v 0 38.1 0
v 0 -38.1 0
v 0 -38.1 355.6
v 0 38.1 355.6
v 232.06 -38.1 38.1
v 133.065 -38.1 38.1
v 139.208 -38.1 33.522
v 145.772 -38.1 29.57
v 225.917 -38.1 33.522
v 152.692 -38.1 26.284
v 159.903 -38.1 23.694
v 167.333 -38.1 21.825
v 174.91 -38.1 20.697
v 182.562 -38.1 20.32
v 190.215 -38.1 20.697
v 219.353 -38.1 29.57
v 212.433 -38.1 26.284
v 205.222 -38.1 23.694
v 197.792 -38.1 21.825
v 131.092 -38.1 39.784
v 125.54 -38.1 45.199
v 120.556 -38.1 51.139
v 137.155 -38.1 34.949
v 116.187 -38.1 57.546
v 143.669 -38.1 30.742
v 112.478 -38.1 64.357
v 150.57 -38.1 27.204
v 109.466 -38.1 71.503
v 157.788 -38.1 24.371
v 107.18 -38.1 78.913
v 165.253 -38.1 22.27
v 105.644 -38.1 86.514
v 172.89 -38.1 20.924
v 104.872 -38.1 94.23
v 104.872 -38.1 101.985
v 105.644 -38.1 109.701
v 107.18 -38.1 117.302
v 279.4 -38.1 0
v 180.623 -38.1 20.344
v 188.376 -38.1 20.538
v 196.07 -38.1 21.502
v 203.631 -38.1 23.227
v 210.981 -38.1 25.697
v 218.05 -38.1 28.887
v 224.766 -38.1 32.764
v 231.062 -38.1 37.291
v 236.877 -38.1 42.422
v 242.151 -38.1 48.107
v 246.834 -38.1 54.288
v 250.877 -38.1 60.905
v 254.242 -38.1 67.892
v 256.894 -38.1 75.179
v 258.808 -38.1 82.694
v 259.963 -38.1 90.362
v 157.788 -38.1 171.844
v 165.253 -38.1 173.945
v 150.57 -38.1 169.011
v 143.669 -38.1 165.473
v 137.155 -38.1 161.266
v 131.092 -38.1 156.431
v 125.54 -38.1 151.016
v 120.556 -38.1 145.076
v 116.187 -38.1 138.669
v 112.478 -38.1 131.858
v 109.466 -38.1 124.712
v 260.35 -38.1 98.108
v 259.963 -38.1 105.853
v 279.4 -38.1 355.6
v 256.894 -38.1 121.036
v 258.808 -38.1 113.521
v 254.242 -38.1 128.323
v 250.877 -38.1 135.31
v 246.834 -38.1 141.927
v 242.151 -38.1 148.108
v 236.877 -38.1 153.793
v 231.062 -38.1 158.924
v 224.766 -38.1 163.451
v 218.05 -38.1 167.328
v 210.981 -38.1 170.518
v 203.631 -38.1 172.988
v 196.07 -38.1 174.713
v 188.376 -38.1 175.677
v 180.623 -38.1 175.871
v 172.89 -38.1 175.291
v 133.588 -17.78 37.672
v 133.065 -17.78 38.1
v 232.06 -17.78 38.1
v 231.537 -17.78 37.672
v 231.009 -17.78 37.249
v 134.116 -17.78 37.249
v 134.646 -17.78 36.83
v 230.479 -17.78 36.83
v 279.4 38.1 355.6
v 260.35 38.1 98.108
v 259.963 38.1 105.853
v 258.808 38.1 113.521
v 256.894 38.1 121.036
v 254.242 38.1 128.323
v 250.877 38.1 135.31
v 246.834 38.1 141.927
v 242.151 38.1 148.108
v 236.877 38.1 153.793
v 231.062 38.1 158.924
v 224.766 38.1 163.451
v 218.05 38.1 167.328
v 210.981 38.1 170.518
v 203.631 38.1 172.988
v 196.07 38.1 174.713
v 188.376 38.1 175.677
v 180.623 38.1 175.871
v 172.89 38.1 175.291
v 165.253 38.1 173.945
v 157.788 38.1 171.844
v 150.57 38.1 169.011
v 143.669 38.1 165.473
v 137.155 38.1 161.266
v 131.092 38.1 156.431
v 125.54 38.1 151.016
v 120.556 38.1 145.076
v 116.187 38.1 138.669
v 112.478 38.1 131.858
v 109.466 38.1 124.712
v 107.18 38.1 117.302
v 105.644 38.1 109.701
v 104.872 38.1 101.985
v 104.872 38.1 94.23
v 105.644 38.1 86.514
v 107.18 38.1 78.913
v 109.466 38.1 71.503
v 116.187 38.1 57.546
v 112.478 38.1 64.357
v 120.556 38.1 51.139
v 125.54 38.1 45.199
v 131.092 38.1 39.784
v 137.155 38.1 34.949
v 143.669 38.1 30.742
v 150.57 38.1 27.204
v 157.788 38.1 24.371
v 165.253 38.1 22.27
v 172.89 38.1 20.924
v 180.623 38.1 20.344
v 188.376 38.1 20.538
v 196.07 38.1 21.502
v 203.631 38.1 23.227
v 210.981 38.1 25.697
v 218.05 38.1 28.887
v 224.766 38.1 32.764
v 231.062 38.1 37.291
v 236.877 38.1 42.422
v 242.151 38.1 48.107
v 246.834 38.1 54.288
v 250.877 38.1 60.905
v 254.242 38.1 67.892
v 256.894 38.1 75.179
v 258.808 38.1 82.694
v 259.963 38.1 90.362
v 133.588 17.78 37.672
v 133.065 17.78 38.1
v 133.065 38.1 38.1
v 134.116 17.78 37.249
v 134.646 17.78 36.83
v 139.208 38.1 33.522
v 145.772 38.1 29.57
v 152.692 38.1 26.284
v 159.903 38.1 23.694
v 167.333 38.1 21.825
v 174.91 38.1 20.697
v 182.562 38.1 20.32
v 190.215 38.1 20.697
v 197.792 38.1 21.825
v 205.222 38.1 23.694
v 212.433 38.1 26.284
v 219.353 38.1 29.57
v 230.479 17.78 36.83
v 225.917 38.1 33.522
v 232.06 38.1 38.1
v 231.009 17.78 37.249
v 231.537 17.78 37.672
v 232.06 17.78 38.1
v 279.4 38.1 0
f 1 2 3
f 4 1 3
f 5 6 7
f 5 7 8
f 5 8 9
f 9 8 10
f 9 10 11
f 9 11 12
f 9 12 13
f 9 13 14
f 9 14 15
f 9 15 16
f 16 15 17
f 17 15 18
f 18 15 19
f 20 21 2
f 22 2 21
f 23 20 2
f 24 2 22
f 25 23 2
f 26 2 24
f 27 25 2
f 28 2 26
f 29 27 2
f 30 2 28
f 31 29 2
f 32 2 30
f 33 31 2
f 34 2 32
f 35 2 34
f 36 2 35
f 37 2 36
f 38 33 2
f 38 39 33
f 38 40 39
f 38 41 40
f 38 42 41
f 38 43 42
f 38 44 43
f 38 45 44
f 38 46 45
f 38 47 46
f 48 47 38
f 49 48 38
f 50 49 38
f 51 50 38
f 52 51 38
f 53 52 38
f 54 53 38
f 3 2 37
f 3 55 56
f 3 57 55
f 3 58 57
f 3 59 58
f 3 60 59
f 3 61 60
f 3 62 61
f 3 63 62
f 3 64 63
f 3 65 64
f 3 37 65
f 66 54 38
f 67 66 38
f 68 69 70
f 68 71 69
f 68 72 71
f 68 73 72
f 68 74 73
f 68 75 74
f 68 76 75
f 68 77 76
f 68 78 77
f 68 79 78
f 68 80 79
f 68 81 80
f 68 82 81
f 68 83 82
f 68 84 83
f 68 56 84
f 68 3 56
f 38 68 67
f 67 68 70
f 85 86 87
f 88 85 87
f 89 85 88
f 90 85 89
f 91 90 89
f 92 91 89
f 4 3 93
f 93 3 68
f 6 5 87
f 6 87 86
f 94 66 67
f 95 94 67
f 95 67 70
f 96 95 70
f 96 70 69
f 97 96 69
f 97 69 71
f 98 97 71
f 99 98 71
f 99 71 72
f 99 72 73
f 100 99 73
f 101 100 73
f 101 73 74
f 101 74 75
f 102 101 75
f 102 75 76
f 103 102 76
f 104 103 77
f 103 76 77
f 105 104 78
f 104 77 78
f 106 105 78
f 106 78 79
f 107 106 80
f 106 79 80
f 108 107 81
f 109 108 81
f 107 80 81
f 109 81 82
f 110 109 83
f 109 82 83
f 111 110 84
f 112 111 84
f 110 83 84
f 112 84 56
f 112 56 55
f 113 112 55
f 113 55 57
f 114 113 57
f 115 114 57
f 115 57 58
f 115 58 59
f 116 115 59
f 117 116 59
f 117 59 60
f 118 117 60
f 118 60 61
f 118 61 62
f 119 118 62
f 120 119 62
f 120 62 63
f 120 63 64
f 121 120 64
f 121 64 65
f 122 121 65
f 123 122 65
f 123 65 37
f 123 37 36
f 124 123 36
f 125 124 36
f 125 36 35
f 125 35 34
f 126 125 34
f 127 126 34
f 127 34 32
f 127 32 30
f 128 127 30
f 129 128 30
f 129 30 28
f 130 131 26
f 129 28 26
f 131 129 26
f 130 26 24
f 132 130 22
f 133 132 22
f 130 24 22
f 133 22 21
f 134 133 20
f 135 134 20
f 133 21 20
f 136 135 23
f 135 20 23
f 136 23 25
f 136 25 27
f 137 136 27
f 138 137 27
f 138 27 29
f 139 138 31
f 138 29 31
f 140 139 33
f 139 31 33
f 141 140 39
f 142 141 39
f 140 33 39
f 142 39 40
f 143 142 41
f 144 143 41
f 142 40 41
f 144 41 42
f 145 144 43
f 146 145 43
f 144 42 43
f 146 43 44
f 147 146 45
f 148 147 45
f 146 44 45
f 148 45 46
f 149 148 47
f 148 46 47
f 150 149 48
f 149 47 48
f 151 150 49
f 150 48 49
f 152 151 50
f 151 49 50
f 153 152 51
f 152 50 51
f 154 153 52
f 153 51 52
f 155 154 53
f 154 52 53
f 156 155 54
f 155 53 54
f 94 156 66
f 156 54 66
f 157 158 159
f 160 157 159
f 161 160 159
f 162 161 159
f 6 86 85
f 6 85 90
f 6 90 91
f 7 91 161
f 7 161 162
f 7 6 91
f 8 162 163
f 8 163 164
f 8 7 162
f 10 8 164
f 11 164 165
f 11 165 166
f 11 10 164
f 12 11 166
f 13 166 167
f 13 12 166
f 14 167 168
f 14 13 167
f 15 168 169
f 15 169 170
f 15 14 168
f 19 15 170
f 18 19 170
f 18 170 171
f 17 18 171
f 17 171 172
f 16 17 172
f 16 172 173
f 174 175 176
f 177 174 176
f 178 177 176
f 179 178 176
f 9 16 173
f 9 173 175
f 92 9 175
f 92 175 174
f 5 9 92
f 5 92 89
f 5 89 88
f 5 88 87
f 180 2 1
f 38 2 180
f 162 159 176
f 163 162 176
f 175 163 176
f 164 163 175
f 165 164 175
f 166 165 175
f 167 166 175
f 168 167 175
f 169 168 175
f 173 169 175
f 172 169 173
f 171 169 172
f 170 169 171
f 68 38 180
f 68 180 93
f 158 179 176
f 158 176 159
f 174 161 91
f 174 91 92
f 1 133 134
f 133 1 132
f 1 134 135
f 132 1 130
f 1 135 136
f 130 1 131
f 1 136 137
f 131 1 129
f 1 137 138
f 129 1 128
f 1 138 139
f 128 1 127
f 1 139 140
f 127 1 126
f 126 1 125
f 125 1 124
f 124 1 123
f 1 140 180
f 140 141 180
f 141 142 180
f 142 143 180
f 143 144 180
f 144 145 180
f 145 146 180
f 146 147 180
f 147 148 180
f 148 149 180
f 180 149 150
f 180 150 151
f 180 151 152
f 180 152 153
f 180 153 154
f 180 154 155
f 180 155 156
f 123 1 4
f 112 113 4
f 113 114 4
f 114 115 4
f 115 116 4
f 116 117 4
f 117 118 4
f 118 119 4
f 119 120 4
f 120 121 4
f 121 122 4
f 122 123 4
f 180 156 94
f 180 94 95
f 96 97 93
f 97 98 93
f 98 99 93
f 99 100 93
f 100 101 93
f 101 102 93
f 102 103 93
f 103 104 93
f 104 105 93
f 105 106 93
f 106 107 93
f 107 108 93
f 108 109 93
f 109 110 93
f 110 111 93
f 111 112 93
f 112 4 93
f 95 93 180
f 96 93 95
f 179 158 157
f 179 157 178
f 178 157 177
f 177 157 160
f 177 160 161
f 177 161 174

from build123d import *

# Parameters (mm, degrees)
F0_W     = 279.4
F0_H     = 355.6
F1_DEPTH = 38.1
F2_R     = 77.7875
F3_DEPTH = 76.201
F5_DEPTH = 76.2
F6_W     = 98.9948503711
F6_H     = 35.56
F7_DEPTH = 1.27


with BuildPart() as f1:
    # F0 (on Front) → F1 (new body, symmetric)
    with BuildSketch(Plane.XZ):
        with Locations((139.7, 177.8)):
            Rectangle(F0_W, F0_H)
    extrude(amount=F1_DEPTH, both=True)

    # F2 (on face) → F3 (cut, through all)
    with BuildSketch(Plane.XZ.offset(38.1)):
        with Locations((182.5625, 98.1075)):
            Circle(F2_R)
    extrude(amount=-F3_DEPTH, mode=Mode.SUBTRACT)


with BuildPart() as f5:
    # F4 (on face) → F5 (new body, through all)
    with BuildSketch(Plane.XZ.offset(38.1)):
        with BuildLine():
            Line((182.5625, 38.1), (133.0650748144, 38.1))
            ThreePointArc((133.0650748144, 38.1), (182.5625, 20.32), (232.0599251856, 38.1))
            Line((232.0599251856, 38.1), (182.5625, 38.1))
        make_face()
    extrude(amount=-F5_DEPTH)

    # F6 (on face) → F7 (cut)
    with BuildSketch(Plane.XY.offset(38.1)):
        with Locations((182.5625, 0)):
            Rectangle(F6_W, F6_H)
    extrude(amount=-F7_DEPTH, mode=Mode.SUBTRACT)


solid = Compound([f1.part, f5.part])
